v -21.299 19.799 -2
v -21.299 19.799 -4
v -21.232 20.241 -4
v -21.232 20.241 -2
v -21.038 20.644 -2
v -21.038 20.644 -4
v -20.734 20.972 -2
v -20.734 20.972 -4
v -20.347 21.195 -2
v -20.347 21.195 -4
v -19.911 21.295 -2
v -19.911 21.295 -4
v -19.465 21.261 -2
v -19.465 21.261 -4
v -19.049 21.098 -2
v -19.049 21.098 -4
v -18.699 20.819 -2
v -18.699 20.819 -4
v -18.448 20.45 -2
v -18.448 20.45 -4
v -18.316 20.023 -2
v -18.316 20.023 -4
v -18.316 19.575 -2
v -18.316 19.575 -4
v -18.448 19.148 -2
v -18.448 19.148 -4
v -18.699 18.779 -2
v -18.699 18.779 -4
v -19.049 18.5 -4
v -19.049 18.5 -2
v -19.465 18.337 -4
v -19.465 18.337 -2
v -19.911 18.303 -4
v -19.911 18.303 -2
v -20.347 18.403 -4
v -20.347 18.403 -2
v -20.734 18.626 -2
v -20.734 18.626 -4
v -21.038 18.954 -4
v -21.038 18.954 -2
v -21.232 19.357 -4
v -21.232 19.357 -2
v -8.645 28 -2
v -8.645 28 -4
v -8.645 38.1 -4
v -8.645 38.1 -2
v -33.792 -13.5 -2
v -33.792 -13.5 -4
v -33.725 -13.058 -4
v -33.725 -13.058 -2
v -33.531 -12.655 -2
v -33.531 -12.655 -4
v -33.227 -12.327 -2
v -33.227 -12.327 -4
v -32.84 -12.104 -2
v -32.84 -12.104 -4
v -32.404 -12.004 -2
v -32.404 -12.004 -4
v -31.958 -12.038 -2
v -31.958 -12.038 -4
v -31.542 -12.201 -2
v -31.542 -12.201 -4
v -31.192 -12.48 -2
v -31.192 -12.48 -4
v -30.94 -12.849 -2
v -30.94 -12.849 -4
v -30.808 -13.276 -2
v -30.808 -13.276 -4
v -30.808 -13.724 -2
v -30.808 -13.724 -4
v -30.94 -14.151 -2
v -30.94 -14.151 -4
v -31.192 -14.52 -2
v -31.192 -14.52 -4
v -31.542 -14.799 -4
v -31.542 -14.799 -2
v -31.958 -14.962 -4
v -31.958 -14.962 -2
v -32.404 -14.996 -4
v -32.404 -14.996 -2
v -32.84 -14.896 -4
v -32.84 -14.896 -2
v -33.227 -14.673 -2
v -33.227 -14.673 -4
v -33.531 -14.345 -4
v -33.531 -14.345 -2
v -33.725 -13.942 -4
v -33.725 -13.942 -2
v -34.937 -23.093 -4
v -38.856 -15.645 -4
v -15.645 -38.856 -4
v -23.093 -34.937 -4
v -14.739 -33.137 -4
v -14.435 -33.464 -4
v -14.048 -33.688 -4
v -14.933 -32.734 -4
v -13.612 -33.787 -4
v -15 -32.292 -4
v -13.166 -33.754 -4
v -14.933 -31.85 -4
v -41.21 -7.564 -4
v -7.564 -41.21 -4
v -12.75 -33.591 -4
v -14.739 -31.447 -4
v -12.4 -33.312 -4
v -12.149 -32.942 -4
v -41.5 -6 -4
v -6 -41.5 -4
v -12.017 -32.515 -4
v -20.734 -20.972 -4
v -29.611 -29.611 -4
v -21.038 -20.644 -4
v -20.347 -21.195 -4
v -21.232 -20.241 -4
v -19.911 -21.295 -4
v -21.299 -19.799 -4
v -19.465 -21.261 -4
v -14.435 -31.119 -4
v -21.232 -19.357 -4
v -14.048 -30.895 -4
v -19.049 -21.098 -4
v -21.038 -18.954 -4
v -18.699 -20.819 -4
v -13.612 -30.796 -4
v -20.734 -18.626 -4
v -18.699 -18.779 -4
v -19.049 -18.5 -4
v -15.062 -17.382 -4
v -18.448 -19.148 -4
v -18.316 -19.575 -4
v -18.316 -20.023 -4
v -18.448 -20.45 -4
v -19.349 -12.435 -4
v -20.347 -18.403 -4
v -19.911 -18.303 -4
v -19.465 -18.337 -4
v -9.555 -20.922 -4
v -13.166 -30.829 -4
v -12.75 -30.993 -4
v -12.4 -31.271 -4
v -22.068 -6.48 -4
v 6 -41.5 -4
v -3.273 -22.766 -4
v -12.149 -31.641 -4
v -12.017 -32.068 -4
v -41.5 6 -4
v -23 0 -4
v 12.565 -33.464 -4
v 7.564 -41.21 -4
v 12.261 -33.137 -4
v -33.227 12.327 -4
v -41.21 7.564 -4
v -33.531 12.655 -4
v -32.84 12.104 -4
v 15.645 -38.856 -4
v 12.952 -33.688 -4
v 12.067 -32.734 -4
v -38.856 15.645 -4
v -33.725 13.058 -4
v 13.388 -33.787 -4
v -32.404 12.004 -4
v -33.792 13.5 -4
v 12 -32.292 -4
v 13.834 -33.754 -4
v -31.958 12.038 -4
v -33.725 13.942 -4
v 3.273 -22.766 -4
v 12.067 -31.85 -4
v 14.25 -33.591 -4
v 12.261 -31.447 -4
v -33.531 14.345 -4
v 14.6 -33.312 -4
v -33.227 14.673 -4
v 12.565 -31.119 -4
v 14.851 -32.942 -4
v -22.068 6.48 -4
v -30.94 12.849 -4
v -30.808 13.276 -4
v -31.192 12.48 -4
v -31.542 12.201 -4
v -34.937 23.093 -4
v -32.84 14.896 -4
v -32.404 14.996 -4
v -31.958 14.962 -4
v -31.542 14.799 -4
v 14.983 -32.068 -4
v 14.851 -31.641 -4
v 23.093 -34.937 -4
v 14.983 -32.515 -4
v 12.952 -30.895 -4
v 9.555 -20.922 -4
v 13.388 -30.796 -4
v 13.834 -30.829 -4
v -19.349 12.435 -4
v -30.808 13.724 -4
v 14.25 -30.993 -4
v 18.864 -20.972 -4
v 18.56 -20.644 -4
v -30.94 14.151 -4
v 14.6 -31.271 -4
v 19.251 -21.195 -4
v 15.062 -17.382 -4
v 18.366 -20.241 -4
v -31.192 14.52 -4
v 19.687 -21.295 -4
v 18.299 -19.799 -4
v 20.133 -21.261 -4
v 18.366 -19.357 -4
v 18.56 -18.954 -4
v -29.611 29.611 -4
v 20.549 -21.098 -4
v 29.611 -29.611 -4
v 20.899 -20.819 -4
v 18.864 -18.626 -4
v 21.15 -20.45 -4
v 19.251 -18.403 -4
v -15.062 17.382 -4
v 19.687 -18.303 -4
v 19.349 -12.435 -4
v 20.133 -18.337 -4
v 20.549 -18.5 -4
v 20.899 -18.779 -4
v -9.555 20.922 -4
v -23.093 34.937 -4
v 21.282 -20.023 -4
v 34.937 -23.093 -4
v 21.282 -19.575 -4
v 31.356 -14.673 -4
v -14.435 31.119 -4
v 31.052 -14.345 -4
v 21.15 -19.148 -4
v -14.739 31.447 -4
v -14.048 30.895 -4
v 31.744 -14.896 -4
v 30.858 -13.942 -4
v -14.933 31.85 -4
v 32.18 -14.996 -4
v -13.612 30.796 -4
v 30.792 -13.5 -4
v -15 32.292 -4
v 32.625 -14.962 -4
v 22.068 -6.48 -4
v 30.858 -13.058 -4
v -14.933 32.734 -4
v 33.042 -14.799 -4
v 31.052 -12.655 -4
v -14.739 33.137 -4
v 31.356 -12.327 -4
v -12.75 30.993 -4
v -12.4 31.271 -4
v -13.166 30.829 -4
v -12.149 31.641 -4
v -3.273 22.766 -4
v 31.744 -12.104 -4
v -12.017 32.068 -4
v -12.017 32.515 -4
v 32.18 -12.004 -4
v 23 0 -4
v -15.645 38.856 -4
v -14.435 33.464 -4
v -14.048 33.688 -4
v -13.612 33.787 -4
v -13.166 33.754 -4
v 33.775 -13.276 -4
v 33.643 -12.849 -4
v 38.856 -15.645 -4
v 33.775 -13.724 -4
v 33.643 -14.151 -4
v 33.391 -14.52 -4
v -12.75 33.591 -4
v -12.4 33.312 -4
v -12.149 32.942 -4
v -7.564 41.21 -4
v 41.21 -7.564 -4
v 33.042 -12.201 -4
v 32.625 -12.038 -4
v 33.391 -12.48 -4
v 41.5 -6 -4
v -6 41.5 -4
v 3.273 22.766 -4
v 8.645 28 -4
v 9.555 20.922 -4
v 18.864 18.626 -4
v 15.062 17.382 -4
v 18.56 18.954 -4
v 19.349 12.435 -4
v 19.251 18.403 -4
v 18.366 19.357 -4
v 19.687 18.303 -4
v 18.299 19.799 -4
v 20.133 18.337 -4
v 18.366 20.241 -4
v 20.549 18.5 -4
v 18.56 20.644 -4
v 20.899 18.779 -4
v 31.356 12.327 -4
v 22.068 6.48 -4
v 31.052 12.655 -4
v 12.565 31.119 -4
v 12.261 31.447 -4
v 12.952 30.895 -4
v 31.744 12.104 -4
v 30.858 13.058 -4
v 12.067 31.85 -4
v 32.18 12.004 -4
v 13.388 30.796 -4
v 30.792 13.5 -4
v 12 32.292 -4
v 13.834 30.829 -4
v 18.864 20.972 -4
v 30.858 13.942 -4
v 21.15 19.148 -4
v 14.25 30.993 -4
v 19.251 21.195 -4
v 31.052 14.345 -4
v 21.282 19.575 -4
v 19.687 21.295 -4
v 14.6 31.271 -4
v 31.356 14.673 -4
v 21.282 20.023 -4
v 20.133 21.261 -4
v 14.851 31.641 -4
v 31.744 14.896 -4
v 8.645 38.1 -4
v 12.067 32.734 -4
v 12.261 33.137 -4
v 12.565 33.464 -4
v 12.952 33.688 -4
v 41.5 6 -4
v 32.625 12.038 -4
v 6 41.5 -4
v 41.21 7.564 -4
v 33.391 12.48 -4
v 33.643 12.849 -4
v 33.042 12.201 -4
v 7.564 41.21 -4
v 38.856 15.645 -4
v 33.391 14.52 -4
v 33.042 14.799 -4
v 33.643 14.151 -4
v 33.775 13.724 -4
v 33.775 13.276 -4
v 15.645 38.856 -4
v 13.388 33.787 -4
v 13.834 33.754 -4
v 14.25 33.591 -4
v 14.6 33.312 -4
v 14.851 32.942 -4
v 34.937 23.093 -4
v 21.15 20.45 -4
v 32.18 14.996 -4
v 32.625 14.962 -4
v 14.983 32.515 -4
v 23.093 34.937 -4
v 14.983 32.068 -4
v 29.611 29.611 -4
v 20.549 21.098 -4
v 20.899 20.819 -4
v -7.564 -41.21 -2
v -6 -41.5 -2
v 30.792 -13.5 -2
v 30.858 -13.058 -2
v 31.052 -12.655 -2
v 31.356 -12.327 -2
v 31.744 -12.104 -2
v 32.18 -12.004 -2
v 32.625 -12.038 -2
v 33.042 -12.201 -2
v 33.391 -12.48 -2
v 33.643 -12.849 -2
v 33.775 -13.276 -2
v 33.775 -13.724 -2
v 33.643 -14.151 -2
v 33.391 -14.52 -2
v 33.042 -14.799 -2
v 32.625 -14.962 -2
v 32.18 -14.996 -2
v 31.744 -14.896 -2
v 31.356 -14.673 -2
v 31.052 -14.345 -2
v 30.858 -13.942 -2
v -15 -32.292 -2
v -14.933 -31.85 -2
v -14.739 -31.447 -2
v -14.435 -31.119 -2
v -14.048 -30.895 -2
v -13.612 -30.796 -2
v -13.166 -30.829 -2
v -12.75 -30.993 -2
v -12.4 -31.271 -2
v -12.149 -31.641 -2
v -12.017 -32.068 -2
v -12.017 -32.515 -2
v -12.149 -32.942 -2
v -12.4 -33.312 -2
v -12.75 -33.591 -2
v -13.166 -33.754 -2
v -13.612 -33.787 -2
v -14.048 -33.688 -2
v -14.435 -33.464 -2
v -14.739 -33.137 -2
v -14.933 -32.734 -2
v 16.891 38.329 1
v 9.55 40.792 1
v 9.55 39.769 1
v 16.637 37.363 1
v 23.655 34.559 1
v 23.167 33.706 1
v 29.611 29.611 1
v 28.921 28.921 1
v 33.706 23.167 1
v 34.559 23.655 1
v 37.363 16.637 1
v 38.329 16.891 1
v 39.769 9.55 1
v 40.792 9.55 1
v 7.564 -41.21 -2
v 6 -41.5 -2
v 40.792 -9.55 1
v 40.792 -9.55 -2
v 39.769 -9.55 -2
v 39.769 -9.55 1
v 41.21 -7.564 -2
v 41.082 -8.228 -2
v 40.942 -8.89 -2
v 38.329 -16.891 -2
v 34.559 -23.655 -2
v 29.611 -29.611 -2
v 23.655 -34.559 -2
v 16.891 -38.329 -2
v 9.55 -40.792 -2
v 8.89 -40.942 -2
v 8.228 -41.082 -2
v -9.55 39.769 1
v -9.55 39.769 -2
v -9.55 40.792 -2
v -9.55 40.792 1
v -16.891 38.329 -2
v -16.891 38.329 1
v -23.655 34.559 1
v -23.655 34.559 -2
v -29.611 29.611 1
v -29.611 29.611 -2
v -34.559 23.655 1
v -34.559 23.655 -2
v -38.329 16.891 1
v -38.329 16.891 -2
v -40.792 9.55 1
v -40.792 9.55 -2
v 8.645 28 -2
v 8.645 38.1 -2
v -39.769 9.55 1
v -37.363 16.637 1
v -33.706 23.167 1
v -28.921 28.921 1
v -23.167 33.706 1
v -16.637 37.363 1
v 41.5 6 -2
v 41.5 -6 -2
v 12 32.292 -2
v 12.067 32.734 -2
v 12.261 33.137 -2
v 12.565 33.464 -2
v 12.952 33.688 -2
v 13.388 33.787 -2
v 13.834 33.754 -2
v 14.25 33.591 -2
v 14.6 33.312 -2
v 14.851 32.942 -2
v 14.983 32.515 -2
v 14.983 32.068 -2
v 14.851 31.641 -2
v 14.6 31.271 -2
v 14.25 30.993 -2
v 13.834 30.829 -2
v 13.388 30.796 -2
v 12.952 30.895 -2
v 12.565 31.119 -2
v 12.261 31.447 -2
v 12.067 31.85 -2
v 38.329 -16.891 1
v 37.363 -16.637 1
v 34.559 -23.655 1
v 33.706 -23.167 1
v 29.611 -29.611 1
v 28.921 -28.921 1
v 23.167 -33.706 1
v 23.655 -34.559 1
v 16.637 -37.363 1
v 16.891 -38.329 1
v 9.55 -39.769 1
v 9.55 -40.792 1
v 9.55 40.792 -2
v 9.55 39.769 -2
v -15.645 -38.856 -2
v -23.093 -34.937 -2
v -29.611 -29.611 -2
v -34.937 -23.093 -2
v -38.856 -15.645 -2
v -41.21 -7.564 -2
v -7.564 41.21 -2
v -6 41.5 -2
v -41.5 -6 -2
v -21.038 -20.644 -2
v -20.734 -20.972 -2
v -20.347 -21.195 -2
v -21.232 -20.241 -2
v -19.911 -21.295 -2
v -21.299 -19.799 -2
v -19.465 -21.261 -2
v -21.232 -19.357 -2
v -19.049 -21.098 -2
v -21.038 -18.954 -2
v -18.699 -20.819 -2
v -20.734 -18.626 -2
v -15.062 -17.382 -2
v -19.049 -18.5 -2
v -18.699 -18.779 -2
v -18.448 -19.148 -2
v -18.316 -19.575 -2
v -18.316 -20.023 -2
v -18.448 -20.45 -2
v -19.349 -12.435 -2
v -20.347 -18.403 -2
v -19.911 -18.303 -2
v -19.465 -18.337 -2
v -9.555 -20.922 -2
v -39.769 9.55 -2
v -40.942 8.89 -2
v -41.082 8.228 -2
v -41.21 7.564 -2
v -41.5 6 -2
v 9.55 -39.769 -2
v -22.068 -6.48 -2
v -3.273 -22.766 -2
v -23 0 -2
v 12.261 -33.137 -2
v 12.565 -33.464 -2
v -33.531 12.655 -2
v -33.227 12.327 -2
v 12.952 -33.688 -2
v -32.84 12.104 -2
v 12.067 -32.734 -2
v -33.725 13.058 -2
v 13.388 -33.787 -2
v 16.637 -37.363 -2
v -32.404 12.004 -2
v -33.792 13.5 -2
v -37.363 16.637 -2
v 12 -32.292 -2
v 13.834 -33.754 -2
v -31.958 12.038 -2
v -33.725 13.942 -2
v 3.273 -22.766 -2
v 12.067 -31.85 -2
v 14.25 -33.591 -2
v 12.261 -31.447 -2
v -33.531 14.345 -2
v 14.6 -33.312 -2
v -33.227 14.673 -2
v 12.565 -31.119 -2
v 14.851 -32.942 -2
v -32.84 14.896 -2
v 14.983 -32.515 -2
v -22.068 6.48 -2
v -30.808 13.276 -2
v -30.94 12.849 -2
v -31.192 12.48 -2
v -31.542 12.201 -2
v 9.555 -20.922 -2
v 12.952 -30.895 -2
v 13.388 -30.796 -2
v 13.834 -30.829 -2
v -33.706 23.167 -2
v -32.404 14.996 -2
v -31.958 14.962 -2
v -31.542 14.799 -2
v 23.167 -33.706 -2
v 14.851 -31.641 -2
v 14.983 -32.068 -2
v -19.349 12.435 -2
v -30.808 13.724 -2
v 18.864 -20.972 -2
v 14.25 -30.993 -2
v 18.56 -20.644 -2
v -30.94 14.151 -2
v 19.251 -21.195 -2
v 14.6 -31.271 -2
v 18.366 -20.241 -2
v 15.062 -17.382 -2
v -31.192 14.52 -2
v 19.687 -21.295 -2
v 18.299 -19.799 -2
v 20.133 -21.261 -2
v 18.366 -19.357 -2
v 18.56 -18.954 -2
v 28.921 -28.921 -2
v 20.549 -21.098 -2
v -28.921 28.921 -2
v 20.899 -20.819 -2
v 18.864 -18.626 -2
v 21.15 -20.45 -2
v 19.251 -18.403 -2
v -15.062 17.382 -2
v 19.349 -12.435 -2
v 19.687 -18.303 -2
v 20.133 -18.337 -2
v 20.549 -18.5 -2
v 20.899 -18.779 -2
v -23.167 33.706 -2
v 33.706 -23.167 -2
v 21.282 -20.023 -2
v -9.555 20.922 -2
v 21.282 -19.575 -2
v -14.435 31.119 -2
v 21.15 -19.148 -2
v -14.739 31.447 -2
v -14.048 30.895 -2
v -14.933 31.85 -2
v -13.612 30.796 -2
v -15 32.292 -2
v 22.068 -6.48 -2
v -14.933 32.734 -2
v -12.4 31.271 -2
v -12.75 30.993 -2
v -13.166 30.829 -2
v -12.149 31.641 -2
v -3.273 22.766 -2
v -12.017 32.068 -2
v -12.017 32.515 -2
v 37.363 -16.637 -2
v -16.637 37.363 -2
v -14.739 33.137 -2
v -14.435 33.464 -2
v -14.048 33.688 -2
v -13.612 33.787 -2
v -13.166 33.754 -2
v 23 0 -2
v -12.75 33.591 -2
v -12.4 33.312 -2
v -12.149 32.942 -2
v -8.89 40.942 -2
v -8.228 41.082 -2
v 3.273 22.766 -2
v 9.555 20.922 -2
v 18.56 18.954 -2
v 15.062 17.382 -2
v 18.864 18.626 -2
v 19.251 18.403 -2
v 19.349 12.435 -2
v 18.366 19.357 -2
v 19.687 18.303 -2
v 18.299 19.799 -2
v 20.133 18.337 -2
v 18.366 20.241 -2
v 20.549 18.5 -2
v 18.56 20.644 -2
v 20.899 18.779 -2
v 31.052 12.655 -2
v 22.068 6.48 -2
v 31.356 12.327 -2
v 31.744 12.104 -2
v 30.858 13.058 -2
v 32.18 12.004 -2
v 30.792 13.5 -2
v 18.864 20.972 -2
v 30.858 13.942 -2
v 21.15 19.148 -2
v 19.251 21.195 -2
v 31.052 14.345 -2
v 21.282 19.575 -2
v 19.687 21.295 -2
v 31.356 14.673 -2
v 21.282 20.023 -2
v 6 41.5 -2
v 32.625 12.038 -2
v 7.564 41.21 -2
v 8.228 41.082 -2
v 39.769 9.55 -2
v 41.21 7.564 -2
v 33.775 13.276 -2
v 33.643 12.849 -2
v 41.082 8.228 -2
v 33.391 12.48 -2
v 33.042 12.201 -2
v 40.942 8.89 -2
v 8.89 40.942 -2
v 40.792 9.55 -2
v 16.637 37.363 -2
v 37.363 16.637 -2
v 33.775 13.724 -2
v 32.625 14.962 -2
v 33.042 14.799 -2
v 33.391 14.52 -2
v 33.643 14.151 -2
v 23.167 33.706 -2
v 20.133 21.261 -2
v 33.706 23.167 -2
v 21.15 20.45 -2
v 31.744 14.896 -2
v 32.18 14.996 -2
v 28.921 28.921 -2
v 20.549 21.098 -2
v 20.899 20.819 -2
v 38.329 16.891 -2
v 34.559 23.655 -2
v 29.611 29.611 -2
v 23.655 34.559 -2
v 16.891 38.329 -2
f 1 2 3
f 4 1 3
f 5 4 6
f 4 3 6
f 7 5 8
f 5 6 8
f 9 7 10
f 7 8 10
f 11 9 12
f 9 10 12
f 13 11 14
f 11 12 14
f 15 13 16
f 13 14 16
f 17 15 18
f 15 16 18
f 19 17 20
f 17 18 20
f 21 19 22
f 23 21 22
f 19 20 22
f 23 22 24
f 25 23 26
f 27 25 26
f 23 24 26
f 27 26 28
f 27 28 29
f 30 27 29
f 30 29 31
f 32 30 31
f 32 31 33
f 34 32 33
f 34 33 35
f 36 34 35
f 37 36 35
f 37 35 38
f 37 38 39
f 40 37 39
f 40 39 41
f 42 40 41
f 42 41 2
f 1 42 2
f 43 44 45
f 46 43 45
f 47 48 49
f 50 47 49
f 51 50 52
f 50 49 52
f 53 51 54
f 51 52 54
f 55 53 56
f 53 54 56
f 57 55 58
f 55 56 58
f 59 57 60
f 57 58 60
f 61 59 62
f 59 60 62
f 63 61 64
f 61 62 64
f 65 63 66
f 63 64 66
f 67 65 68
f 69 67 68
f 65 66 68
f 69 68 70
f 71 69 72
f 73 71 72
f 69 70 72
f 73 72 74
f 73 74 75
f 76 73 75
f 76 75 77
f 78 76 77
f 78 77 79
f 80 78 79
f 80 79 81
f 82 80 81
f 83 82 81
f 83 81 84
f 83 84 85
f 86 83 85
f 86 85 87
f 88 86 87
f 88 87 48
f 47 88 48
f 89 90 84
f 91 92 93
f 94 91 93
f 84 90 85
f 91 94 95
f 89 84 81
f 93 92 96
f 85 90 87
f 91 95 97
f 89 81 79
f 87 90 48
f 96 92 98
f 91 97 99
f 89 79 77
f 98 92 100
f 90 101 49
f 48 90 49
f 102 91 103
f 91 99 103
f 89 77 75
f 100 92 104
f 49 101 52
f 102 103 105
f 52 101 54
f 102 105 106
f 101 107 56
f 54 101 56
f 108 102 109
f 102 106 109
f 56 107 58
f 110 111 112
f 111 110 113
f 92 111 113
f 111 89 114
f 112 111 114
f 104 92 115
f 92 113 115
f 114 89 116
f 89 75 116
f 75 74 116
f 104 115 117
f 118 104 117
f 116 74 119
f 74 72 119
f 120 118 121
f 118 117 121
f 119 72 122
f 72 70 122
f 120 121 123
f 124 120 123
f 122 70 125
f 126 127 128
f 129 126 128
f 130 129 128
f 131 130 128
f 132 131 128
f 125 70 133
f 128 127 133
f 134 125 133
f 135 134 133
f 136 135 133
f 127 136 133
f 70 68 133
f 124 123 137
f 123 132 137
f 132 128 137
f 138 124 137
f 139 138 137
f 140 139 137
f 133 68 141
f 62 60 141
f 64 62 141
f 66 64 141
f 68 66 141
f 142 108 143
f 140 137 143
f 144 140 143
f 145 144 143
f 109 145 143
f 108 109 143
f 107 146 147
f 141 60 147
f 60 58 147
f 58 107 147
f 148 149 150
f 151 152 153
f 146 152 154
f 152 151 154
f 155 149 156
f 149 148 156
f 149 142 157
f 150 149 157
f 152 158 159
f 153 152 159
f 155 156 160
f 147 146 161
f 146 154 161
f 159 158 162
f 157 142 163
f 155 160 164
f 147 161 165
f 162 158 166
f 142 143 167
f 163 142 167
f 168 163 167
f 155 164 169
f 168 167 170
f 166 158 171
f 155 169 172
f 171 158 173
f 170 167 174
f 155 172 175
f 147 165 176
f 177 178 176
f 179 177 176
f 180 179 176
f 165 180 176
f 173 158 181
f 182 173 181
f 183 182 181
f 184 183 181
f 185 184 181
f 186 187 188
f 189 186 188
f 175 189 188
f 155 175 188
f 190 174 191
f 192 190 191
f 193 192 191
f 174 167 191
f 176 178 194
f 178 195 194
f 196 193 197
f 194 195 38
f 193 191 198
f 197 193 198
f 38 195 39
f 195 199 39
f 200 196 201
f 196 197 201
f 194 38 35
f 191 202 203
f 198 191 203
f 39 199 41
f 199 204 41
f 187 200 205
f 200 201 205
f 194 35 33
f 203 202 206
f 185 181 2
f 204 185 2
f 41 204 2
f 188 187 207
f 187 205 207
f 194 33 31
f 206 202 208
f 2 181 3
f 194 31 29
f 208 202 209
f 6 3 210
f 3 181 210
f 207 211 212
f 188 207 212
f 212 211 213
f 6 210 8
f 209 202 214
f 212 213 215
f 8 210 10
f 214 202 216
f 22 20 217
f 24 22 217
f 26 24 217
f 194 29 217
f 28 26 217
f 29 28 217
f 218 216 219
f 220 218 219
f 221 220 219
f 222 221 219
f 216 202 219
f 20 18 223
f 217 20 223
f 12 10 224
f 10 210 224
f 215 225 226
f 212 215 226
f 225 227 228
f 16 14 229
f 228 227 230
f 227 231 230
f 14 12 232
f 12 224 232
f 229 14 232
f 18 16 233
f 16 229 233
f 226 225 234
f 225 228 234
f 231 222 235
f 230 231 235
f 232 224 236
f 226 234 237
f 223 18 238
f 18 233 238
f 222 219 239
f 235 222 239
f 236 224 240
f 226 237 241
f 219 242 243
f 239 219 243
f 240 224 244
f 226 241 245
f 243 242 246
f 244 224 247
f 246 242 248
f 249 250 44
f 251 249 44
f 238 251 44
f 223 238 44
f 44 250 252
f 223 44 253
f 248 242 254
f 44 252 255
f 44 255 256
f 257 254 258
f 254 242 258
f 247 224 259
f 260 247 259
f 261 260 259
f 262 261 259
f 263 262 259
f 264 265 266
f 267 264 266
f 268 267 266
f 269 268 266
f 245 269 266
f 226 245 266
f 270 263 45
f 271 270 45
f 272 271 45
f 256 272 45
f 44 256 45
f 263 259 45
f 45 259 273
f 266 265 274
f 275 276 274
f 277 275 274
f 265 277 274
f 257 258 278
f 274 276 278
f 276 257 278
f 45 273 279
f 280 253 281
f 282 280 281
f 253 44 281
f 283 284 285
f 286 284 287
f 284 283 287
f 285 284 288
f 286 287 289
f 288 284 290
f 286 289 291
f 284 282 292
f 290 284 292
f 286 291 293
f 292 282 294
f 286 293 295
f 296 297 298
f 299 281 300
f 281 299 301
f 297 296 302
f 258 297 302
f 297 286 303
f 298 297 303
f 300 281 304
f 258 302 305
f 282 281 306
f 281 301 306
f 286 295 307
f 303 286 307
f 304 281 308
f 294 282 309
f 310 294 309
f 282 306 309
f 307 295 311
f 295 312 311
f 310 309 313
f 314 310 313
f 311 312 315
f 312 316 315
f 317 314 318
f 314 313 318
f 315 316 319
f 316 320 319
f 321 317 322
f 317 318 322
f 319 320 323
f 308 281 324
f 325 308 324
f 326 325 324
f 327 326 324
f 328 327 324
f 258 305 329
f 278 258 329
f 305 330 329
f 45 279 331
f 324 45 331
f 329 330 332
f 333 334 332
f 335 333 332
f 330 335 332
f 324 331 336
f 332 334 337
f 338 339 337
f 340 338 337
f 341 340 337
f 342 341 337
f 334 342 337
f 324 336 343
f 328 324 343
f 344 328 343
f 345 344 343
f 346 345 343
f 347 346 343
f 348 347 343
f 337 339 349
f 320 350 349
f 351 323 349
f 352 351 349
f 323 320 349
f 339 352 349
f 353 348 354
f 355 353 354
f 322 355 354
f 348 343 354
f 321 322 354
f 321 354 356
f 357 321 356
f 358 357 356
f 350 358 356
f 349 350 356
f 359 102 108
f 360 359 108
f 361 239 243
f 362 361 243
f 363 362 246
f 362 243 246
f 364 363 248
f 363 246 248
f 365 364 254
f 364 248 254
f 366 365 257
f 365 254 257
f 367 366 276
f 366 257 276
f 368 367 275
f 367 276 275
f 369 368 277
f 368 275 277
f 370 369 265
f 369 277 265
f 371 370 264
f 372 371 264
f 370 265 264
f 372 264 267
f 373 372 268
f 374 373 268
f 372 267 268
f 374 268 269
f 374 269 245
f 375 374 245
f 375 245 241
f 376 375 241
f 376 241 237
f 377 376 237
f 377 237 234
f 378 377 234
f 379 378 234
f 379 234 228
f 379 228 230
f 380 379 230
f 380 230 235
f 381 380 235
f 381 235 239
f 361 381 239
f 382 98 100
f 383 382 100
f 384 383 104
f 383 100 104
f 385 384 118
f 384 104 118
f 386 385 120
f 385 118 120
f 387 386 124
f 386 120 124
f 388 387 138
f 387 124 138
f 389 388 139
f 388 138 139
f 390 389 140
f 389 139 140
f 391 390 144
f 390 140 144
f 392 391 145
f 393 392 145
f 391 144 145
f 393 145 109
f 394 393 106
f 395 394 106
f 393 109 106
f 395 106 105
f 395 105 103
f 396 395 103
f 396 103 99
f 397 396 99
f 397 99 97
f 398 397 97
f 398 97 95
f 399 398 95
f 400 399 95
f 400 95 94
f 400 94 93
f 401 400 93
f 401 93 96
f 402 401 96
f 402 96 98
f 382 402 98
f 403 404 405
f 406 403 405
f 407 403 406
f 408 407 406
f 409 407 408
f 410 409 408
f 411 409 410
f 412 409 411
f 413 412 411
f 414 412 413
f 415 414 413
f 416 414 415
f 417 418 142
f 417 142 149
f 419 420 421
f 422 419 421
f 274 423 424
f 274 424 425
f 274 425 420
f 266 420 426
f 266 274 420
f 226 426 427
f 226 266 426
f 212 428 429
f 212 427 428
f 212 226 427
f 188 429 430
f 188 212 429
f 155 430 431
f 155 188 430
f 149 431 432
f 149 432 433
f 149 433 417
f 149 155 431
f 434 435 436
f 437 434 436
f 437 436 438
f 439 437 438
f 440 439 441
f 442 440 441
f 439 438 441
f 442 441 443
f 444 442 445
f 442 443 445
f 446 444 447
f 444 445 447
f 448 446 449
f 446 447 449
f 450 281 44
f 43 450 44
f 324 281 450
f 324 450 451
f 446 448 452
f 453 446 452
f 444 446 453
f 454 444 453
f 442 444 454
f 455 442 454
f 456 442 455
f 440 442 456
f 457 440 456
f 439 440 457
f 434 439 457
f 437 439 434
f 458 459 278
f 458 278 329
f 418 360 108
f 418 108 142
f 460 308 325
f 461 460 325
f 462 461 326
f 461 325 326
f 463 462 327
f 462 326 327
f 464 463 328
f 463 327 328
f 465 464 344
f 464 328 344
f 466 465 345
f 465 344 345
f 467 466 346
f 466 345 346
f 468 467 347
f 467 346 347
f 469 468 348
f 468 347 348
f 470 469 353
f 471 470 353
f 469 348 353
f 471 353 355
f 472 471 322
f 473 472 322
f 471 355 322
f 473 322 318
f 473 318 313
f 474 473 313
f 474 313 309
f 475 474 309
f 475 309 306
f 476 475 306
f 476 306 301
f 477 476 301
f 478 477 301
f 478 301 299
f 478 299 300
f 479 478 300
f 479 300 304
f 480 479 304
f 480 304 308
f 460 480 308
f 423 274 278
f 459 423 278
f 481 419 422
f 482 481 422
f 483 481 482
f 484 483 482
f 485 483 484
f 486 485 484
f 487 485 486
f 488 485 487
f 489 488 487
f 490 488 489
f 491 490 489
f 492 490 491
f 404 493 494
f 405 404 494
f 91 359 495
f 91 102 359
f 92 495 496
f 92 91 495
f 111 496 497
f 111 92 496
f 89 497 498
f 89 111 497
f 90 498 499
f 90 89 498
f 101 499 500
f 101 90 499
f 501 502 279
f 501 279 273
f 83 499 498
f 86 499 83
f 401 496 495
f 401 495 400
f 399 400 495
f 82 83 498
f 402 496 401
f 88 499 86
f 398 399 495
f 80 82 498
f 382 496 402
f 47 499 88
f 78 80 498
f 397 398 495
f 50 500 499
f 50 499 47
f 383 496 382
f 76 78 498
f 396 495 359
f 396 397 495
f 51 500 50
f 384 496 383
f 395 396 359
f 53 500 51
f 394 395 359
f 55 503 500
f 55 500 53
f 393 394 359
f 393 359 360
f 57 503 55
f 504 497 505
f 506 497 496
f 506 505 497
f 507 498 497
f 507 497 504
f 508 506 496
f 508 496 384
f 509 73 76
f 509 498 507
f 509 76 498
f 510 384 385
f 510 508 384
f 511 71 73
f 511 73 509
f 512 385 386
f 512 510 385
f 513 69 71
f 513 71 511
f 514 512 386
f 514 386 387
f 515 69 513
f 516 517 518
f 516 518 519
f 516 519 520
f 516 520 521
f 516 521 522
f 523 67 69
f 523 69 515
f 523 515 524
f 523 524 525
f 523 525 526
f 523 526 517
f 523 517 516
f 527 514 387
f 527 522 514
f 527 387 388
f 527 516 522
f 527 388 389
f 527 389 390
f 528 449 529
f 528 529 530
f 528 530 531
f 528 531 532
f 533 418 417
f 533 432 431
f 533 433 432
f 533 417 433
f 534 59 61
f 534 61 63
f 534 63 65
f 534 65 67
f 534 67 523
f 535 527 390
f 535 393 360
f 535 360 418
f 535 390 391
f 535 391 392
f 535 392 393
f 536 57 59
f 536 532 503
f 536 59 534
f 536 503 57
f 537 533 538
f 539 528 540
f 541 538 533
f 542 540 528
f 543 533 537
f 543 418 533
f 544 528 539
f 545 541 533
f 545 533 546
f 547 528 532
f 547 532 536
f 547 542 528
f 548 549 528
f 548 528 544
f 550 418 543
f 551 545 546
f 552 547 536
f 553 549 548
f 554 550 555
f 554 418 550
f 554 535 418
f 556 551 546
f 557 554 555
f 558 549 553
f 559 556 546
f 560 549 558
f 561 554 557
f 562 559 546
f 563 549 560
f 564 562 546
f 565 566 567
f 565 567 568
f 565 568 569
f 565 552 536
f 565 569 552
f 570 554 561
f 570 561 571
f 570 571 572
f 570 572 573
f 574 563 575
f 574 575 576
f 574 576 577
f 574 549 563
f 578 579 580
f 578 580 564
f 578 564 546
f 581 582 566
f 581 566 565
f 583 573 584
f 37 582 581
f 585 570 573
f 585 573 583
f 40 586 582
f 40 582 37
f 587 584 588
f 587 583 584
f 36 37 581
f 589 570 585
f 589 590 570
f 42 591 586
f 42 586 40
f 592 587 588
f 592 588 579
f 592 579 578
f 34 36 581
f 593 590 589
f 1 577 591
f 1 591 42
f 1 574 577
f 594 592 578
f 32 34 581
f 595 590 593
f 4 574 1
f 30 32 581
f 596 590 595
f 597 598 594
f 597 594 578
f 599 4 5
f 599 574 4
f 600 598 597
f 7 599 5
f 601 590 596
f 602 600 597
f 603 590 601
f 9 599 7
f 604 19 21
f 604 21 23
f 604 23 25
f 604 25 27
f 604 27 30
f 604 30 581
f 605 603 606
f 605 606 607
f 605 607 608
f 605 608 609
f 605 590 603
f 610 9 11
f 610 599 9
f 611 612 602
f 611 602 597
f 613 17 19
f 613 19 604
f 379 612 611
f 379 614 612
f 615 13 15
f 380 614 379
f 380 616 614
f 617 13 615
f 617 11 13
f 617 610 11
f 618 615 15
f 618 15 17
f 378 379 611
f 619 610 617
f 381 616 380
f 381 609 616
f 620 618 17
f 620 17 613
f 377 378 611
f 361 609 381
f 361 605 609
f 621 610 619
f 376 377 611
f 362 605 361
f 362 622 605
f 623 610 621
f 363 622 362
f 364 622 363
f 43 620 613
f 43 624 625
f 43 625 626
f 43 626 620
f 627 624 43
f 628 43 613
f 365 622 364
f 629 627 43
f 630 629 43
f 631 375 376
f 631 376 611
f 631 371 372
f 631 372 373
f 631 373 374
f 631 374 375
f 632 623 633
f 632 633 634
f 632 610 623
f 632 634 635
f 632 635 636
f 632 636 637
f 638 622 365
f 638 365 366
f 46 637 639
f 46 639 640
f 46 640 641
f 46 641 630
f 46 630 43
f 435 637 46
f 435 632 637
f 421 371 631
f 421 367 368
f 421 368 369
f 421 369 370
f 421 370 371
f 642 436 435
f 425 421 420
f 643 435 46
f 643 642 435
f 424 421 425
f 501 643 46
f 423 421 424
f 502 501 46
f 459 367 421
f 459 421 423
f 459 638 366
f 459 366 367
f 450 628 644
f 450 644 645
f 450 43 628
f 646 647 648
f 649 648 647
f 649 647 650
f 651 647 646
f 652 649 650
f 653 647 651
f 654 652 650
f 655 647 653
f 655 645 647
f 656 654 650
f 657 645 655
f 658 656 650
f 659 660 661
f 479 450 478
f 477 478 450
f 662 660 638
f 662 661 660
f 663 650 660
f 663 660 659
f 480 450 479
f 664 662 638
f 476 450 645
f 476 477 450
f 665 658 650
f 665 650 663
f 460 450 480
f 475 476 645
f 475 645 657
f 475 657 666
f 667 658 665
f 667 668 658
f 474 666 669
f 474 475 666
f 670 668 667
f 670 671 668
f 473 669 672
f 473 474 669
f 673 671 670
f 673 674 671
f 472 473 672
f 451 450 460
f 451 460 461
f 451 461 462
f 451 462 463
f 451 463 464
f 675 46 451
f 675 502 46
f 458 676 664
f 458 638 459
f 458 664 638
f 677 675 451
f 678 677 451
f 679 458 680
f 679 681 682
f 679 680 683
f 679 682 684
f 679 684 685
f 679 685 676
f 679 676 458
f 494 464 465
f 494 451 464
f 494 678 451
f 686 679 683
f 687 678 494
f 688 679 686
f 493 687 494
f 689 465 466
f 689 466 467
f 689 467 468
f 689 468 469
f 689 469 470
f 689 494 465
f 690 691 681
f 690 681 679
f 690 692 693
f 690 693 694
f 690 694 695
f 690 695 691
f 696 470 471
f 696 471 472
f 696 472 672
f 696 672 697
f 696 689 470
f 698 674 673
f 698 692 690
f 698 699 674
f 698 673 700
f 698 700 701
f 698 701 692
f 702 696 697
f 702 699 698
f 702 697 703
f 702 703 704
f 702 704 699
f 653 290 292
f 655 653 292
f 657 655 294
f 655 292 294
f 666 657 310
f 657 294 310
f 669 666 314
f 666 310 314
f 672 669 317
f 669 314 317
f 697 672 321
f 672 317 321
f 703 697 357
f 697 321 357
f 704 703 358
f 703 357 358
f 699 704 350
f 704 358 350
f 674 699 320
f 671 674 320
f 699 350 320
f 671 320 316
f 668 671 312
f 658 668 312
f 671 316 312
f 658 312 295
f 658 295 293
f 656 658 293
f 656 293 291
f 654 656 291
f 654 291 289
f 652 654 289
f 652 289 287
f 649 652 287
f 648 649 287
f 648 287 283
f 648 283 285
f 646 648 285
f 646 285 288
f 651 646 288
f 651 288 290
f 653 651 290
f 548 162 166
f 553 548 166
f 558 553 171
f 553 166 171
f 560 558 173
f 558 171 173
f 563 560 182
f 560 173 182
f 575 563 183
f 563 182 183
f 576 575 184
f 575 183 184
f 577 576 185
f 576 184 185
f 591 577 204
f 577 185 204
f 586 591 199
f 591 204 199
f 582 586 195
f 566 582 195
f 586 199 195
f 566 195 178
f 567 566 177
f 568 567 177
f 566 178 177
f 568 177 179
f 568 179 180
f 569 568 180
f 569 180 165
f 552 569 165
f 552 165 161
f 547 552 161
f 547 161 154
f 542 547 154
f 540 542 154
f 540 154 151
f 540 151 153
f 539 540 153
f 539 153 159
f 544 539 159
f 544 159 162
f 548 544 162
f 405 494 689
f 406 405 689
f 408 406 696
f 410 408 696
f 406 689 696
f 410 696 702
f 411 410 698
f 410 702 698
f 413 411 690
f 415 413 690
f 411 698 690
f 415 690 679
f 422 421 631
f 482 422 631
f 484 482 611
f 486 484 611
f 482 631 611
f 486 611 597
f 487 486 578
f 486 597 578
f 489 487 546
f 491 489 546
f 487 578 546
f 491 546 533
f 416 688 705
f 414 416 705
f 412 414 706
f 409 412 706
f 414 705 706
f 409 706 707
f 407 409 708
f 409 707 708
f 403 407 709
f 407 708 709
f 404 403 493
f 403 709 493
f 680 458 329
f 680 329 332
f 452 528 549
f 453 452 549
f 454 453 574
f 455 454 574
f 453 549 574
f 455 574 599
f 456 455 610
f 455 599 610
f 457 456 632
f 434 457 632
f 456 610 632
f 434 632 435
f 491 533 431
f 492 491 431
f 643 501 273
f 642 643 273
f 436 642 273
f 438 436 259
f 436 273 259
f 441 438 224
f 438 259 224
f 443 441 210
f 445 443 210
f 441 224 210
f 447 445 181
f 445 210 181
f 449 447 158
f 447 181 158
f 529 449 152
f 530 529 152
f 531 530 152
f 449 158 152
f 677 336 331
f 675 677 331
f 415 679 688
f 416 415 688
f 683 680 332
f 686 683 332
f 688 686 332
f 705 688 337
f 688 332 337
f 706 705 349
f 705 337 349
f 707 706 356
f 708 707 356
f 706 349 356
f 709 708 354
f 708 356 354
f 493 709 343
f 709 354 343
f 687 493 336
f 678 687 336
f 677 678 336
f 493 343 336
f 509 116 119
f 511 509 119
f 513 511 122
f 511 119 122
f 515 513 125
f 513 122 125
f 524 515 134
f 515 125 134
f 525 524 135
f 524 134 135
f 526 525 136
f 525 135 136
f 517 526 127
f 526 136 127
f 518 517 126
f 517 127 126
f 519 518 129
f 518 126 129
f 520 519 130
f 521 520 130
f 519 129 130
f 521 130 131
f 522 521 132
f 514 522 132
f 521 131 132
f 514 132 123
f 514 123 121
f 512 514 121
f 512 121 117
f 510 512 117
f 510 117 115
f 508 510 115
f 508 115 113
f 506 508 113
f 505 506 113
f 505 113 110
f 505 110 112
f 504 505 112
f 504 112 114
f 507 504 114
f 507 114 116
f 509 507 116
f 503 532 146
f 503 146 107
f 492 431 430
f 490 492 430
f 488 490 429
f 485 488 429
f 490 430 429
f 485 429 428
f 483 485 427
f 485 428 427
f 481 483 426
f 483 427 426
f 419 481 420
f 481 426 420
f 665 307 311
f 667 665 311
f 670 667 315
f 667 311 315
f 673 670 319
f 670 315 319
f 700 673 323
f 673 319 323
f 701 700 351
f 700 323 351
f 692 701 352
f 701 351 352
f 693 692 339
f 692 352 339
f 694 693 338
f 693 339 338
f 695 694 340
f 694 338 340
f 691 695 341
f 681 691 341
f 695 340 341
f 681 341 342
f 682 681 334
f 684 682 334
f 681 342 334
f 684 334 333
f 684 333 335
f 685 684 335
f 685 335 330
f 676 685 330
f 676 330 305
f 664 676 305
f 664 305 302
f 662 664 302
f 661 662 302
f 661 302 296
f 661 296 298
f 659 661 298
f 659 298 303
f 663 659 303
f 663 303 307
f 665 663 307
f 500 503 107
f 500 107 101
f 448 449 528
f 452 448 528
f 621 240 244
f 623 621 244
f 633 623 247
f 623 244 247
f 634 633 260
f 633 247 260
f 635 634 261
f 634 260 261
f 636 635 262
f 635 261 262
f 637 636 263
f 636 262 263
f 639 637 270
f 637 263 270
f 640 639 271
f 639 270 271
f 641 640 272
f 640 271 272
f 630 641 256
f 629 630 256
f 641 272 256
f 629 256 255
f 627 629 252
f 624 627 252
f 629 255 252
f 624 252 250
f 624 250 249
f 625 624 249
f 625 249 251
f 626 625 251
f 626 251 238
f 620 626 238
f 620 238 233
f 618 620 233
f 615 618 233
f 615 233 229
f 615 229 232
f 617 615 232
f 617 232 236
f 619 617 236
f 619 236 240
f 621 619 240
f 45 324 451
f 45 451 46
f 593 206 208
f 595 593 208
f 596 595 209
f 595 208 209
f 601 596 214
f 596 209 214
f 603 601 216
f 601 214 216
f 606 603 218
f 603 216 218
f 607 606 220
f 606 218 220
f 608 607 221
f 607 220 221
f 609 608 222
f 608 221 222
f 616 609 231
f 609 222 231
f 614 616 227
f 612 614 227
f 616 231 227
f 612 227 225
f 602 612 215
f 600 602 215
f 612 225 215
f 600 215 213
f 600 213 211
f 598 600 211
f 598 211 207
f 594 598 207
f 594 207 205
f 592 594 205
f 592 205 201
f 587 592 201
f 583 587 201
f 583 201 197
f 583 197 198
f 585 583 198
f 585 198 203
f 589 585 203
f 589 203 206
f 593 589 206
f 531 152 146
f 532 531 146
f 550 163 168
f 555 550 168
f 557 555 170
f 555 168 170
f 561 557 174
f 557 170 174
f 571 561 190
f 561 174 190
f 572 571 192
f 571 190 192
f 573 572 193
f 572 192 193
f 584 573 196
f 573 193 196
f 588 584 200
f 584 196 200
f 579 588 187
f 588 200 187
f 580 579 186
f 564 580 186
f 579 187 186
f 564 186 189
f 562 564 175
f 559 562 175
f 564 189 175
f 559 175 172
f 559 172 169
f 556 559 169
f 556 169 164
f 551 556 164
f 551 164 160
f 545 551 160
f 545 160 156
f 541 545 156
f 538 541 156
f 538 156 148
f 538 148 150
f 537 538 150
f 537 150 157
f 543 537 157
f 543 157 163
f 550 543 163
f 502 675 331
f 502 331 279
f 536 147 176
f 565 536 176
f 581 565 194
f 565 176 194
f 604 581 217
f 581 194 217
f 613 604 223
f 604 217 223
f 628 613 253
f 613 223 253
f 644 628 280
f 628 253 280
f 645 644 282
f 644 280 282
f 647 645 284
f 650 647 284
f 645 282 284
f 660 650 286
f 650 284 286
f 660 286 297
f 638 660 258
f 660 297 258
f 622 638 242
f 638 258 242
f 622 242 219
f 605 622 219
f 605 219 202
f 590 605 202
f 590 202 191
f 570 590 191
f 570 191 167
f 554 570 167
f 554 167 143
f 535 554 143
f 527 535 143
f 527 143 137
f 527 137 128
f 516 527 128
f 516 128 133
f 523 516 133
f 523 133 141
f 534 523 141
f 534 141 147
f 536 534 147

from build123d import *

# Parameters (mm, degrees)
EXTRUDE_1_DEPTH          = 2
HOLE_WIZARD_3_0_3_1_D    = 3
HOLE_WIZARD_M421_D       = 46
FILLET_1_R               = 42
EXTRUDE_2_DEPTH          = 3
PATTERN_CIRCULAR_1_COUNT = 3
PATTERN_CIRCULAR_1_ANGLE = 180
SKETCH_12_W              = 17.29
SKETCH_12_H              = 10.1
CUT_EXTRUDE_2_DEPTH      = 10


with BuildPart() as part:
    # Эскиз1 → Бобышка-Вытянуть1 (new body)
    with BuildSketch(Plane.XY.offset(-2)):
        Polygon((41.5, 6), (35.95120701, 35.95120701), (6, 41.5), (-6, 41.5), (-35.95120701, 35.95120701), (-41.5, 6), (-41.5, -6), (-35.95120701, -35.95120701), (-6, -41.5), (6, -41.5), (35.95120701, -35.95120701), (41.5, -6), align=None)
    extrude(amount=-EXTRUDE_1_DEPTH)

    # Диаметр отверстия Ø3.0 (3)1 (through all)
    with Locations(Plane.XY.offset(-2)):
        with Locations((32.291639785, -13.5), (32.291639785, 13.5), (19.798989873, 19.798989873), (19.798989873, -19.798989873), (13.5, -32.291639785), (-13.5, -32.291639785), (-19.798989873, -19.798989873), (-19.798989873, 19.798989873), (-13.5, 32.291639785), (13.5, 32.291639785), (-32.291639785, 13.5), (-32.291639785, -13.5)):
            Hole(HOLE_WIZARD_3_0_3_1_D / 2)

    # Отверстие с зазором M421 (through all)
    with Locations(Plane.XY.offset(-2)):
        with Locations((0, 0)):
            Hole(HOLE_WIZARD_M421_D / 2)

    # Скругление1
    fillet_1_edges = [part.edges().sort_by_distance(p)[0] for p in [
        (35.95120701, -35.95120701, -3),
        (-35.95120701, -35.95120701, -3),
        (-35.95120701, 35.95120701, -3),
        (35.95120701, 35.95120701, -3),
    ]]
    fillet(fillet_1_edges, radius=FILLET_1_R)

    # Эскиз10 → Бобышка-Вытянуть2 (add)
    with BuildSketch(Plane.XY.offset(-2)):
        with BuildLine():
            Line((-9.549876115, 39.769458963), (-9.549876115, 40.792474564))
            ThreePointArc((-9.549876115, 40.792474564), (-29.611492945, 29.611492945), (-40.792474564, 9.549876115))
            Line((-40.792474564, 9.549876115), (-39.769458963, 9.549876115))
            ThreePointArc((-39.769458963, 9.549876115), (-28.920667351, 28.920667351), (-9.549876115, 39.769458963))
        make_face()
    extrude_2 = extrude(amount=EXTRUDE_2_DEPTH)

    # Круговой массив1: Бобышка-Вытянуть2 ×3 about axis
    pattern_circular_1_axis = Axis((0, 0, 0), (0, 0, -1))
    for i in range(1, PATTERN_CIRCULAR_1_COUNT):
        add(extrude_2.rotate(pattern_circular_1_axis, i * PATTERN_CIRCULAR_1_ANGLE / (PATTERN_CIRCULAR_1_COUNT - 1)))

    # Эскиз12 → Вырез-Вытянуть2 (cut)
    with BuildSketch(Plane(origin=(0, 0, -4), x_dir=(-1, 0, 0), z_dir=(0, 0, -1))):
        with Locations((0, 33.05)):
            Rectangle(SKETCH_12_W, SKETCH_12_H)
    extrude(amount=-CUT_EXTRUDE_2_DEPTH, mode=Mode.SUBTRACT)


solid = part.part
